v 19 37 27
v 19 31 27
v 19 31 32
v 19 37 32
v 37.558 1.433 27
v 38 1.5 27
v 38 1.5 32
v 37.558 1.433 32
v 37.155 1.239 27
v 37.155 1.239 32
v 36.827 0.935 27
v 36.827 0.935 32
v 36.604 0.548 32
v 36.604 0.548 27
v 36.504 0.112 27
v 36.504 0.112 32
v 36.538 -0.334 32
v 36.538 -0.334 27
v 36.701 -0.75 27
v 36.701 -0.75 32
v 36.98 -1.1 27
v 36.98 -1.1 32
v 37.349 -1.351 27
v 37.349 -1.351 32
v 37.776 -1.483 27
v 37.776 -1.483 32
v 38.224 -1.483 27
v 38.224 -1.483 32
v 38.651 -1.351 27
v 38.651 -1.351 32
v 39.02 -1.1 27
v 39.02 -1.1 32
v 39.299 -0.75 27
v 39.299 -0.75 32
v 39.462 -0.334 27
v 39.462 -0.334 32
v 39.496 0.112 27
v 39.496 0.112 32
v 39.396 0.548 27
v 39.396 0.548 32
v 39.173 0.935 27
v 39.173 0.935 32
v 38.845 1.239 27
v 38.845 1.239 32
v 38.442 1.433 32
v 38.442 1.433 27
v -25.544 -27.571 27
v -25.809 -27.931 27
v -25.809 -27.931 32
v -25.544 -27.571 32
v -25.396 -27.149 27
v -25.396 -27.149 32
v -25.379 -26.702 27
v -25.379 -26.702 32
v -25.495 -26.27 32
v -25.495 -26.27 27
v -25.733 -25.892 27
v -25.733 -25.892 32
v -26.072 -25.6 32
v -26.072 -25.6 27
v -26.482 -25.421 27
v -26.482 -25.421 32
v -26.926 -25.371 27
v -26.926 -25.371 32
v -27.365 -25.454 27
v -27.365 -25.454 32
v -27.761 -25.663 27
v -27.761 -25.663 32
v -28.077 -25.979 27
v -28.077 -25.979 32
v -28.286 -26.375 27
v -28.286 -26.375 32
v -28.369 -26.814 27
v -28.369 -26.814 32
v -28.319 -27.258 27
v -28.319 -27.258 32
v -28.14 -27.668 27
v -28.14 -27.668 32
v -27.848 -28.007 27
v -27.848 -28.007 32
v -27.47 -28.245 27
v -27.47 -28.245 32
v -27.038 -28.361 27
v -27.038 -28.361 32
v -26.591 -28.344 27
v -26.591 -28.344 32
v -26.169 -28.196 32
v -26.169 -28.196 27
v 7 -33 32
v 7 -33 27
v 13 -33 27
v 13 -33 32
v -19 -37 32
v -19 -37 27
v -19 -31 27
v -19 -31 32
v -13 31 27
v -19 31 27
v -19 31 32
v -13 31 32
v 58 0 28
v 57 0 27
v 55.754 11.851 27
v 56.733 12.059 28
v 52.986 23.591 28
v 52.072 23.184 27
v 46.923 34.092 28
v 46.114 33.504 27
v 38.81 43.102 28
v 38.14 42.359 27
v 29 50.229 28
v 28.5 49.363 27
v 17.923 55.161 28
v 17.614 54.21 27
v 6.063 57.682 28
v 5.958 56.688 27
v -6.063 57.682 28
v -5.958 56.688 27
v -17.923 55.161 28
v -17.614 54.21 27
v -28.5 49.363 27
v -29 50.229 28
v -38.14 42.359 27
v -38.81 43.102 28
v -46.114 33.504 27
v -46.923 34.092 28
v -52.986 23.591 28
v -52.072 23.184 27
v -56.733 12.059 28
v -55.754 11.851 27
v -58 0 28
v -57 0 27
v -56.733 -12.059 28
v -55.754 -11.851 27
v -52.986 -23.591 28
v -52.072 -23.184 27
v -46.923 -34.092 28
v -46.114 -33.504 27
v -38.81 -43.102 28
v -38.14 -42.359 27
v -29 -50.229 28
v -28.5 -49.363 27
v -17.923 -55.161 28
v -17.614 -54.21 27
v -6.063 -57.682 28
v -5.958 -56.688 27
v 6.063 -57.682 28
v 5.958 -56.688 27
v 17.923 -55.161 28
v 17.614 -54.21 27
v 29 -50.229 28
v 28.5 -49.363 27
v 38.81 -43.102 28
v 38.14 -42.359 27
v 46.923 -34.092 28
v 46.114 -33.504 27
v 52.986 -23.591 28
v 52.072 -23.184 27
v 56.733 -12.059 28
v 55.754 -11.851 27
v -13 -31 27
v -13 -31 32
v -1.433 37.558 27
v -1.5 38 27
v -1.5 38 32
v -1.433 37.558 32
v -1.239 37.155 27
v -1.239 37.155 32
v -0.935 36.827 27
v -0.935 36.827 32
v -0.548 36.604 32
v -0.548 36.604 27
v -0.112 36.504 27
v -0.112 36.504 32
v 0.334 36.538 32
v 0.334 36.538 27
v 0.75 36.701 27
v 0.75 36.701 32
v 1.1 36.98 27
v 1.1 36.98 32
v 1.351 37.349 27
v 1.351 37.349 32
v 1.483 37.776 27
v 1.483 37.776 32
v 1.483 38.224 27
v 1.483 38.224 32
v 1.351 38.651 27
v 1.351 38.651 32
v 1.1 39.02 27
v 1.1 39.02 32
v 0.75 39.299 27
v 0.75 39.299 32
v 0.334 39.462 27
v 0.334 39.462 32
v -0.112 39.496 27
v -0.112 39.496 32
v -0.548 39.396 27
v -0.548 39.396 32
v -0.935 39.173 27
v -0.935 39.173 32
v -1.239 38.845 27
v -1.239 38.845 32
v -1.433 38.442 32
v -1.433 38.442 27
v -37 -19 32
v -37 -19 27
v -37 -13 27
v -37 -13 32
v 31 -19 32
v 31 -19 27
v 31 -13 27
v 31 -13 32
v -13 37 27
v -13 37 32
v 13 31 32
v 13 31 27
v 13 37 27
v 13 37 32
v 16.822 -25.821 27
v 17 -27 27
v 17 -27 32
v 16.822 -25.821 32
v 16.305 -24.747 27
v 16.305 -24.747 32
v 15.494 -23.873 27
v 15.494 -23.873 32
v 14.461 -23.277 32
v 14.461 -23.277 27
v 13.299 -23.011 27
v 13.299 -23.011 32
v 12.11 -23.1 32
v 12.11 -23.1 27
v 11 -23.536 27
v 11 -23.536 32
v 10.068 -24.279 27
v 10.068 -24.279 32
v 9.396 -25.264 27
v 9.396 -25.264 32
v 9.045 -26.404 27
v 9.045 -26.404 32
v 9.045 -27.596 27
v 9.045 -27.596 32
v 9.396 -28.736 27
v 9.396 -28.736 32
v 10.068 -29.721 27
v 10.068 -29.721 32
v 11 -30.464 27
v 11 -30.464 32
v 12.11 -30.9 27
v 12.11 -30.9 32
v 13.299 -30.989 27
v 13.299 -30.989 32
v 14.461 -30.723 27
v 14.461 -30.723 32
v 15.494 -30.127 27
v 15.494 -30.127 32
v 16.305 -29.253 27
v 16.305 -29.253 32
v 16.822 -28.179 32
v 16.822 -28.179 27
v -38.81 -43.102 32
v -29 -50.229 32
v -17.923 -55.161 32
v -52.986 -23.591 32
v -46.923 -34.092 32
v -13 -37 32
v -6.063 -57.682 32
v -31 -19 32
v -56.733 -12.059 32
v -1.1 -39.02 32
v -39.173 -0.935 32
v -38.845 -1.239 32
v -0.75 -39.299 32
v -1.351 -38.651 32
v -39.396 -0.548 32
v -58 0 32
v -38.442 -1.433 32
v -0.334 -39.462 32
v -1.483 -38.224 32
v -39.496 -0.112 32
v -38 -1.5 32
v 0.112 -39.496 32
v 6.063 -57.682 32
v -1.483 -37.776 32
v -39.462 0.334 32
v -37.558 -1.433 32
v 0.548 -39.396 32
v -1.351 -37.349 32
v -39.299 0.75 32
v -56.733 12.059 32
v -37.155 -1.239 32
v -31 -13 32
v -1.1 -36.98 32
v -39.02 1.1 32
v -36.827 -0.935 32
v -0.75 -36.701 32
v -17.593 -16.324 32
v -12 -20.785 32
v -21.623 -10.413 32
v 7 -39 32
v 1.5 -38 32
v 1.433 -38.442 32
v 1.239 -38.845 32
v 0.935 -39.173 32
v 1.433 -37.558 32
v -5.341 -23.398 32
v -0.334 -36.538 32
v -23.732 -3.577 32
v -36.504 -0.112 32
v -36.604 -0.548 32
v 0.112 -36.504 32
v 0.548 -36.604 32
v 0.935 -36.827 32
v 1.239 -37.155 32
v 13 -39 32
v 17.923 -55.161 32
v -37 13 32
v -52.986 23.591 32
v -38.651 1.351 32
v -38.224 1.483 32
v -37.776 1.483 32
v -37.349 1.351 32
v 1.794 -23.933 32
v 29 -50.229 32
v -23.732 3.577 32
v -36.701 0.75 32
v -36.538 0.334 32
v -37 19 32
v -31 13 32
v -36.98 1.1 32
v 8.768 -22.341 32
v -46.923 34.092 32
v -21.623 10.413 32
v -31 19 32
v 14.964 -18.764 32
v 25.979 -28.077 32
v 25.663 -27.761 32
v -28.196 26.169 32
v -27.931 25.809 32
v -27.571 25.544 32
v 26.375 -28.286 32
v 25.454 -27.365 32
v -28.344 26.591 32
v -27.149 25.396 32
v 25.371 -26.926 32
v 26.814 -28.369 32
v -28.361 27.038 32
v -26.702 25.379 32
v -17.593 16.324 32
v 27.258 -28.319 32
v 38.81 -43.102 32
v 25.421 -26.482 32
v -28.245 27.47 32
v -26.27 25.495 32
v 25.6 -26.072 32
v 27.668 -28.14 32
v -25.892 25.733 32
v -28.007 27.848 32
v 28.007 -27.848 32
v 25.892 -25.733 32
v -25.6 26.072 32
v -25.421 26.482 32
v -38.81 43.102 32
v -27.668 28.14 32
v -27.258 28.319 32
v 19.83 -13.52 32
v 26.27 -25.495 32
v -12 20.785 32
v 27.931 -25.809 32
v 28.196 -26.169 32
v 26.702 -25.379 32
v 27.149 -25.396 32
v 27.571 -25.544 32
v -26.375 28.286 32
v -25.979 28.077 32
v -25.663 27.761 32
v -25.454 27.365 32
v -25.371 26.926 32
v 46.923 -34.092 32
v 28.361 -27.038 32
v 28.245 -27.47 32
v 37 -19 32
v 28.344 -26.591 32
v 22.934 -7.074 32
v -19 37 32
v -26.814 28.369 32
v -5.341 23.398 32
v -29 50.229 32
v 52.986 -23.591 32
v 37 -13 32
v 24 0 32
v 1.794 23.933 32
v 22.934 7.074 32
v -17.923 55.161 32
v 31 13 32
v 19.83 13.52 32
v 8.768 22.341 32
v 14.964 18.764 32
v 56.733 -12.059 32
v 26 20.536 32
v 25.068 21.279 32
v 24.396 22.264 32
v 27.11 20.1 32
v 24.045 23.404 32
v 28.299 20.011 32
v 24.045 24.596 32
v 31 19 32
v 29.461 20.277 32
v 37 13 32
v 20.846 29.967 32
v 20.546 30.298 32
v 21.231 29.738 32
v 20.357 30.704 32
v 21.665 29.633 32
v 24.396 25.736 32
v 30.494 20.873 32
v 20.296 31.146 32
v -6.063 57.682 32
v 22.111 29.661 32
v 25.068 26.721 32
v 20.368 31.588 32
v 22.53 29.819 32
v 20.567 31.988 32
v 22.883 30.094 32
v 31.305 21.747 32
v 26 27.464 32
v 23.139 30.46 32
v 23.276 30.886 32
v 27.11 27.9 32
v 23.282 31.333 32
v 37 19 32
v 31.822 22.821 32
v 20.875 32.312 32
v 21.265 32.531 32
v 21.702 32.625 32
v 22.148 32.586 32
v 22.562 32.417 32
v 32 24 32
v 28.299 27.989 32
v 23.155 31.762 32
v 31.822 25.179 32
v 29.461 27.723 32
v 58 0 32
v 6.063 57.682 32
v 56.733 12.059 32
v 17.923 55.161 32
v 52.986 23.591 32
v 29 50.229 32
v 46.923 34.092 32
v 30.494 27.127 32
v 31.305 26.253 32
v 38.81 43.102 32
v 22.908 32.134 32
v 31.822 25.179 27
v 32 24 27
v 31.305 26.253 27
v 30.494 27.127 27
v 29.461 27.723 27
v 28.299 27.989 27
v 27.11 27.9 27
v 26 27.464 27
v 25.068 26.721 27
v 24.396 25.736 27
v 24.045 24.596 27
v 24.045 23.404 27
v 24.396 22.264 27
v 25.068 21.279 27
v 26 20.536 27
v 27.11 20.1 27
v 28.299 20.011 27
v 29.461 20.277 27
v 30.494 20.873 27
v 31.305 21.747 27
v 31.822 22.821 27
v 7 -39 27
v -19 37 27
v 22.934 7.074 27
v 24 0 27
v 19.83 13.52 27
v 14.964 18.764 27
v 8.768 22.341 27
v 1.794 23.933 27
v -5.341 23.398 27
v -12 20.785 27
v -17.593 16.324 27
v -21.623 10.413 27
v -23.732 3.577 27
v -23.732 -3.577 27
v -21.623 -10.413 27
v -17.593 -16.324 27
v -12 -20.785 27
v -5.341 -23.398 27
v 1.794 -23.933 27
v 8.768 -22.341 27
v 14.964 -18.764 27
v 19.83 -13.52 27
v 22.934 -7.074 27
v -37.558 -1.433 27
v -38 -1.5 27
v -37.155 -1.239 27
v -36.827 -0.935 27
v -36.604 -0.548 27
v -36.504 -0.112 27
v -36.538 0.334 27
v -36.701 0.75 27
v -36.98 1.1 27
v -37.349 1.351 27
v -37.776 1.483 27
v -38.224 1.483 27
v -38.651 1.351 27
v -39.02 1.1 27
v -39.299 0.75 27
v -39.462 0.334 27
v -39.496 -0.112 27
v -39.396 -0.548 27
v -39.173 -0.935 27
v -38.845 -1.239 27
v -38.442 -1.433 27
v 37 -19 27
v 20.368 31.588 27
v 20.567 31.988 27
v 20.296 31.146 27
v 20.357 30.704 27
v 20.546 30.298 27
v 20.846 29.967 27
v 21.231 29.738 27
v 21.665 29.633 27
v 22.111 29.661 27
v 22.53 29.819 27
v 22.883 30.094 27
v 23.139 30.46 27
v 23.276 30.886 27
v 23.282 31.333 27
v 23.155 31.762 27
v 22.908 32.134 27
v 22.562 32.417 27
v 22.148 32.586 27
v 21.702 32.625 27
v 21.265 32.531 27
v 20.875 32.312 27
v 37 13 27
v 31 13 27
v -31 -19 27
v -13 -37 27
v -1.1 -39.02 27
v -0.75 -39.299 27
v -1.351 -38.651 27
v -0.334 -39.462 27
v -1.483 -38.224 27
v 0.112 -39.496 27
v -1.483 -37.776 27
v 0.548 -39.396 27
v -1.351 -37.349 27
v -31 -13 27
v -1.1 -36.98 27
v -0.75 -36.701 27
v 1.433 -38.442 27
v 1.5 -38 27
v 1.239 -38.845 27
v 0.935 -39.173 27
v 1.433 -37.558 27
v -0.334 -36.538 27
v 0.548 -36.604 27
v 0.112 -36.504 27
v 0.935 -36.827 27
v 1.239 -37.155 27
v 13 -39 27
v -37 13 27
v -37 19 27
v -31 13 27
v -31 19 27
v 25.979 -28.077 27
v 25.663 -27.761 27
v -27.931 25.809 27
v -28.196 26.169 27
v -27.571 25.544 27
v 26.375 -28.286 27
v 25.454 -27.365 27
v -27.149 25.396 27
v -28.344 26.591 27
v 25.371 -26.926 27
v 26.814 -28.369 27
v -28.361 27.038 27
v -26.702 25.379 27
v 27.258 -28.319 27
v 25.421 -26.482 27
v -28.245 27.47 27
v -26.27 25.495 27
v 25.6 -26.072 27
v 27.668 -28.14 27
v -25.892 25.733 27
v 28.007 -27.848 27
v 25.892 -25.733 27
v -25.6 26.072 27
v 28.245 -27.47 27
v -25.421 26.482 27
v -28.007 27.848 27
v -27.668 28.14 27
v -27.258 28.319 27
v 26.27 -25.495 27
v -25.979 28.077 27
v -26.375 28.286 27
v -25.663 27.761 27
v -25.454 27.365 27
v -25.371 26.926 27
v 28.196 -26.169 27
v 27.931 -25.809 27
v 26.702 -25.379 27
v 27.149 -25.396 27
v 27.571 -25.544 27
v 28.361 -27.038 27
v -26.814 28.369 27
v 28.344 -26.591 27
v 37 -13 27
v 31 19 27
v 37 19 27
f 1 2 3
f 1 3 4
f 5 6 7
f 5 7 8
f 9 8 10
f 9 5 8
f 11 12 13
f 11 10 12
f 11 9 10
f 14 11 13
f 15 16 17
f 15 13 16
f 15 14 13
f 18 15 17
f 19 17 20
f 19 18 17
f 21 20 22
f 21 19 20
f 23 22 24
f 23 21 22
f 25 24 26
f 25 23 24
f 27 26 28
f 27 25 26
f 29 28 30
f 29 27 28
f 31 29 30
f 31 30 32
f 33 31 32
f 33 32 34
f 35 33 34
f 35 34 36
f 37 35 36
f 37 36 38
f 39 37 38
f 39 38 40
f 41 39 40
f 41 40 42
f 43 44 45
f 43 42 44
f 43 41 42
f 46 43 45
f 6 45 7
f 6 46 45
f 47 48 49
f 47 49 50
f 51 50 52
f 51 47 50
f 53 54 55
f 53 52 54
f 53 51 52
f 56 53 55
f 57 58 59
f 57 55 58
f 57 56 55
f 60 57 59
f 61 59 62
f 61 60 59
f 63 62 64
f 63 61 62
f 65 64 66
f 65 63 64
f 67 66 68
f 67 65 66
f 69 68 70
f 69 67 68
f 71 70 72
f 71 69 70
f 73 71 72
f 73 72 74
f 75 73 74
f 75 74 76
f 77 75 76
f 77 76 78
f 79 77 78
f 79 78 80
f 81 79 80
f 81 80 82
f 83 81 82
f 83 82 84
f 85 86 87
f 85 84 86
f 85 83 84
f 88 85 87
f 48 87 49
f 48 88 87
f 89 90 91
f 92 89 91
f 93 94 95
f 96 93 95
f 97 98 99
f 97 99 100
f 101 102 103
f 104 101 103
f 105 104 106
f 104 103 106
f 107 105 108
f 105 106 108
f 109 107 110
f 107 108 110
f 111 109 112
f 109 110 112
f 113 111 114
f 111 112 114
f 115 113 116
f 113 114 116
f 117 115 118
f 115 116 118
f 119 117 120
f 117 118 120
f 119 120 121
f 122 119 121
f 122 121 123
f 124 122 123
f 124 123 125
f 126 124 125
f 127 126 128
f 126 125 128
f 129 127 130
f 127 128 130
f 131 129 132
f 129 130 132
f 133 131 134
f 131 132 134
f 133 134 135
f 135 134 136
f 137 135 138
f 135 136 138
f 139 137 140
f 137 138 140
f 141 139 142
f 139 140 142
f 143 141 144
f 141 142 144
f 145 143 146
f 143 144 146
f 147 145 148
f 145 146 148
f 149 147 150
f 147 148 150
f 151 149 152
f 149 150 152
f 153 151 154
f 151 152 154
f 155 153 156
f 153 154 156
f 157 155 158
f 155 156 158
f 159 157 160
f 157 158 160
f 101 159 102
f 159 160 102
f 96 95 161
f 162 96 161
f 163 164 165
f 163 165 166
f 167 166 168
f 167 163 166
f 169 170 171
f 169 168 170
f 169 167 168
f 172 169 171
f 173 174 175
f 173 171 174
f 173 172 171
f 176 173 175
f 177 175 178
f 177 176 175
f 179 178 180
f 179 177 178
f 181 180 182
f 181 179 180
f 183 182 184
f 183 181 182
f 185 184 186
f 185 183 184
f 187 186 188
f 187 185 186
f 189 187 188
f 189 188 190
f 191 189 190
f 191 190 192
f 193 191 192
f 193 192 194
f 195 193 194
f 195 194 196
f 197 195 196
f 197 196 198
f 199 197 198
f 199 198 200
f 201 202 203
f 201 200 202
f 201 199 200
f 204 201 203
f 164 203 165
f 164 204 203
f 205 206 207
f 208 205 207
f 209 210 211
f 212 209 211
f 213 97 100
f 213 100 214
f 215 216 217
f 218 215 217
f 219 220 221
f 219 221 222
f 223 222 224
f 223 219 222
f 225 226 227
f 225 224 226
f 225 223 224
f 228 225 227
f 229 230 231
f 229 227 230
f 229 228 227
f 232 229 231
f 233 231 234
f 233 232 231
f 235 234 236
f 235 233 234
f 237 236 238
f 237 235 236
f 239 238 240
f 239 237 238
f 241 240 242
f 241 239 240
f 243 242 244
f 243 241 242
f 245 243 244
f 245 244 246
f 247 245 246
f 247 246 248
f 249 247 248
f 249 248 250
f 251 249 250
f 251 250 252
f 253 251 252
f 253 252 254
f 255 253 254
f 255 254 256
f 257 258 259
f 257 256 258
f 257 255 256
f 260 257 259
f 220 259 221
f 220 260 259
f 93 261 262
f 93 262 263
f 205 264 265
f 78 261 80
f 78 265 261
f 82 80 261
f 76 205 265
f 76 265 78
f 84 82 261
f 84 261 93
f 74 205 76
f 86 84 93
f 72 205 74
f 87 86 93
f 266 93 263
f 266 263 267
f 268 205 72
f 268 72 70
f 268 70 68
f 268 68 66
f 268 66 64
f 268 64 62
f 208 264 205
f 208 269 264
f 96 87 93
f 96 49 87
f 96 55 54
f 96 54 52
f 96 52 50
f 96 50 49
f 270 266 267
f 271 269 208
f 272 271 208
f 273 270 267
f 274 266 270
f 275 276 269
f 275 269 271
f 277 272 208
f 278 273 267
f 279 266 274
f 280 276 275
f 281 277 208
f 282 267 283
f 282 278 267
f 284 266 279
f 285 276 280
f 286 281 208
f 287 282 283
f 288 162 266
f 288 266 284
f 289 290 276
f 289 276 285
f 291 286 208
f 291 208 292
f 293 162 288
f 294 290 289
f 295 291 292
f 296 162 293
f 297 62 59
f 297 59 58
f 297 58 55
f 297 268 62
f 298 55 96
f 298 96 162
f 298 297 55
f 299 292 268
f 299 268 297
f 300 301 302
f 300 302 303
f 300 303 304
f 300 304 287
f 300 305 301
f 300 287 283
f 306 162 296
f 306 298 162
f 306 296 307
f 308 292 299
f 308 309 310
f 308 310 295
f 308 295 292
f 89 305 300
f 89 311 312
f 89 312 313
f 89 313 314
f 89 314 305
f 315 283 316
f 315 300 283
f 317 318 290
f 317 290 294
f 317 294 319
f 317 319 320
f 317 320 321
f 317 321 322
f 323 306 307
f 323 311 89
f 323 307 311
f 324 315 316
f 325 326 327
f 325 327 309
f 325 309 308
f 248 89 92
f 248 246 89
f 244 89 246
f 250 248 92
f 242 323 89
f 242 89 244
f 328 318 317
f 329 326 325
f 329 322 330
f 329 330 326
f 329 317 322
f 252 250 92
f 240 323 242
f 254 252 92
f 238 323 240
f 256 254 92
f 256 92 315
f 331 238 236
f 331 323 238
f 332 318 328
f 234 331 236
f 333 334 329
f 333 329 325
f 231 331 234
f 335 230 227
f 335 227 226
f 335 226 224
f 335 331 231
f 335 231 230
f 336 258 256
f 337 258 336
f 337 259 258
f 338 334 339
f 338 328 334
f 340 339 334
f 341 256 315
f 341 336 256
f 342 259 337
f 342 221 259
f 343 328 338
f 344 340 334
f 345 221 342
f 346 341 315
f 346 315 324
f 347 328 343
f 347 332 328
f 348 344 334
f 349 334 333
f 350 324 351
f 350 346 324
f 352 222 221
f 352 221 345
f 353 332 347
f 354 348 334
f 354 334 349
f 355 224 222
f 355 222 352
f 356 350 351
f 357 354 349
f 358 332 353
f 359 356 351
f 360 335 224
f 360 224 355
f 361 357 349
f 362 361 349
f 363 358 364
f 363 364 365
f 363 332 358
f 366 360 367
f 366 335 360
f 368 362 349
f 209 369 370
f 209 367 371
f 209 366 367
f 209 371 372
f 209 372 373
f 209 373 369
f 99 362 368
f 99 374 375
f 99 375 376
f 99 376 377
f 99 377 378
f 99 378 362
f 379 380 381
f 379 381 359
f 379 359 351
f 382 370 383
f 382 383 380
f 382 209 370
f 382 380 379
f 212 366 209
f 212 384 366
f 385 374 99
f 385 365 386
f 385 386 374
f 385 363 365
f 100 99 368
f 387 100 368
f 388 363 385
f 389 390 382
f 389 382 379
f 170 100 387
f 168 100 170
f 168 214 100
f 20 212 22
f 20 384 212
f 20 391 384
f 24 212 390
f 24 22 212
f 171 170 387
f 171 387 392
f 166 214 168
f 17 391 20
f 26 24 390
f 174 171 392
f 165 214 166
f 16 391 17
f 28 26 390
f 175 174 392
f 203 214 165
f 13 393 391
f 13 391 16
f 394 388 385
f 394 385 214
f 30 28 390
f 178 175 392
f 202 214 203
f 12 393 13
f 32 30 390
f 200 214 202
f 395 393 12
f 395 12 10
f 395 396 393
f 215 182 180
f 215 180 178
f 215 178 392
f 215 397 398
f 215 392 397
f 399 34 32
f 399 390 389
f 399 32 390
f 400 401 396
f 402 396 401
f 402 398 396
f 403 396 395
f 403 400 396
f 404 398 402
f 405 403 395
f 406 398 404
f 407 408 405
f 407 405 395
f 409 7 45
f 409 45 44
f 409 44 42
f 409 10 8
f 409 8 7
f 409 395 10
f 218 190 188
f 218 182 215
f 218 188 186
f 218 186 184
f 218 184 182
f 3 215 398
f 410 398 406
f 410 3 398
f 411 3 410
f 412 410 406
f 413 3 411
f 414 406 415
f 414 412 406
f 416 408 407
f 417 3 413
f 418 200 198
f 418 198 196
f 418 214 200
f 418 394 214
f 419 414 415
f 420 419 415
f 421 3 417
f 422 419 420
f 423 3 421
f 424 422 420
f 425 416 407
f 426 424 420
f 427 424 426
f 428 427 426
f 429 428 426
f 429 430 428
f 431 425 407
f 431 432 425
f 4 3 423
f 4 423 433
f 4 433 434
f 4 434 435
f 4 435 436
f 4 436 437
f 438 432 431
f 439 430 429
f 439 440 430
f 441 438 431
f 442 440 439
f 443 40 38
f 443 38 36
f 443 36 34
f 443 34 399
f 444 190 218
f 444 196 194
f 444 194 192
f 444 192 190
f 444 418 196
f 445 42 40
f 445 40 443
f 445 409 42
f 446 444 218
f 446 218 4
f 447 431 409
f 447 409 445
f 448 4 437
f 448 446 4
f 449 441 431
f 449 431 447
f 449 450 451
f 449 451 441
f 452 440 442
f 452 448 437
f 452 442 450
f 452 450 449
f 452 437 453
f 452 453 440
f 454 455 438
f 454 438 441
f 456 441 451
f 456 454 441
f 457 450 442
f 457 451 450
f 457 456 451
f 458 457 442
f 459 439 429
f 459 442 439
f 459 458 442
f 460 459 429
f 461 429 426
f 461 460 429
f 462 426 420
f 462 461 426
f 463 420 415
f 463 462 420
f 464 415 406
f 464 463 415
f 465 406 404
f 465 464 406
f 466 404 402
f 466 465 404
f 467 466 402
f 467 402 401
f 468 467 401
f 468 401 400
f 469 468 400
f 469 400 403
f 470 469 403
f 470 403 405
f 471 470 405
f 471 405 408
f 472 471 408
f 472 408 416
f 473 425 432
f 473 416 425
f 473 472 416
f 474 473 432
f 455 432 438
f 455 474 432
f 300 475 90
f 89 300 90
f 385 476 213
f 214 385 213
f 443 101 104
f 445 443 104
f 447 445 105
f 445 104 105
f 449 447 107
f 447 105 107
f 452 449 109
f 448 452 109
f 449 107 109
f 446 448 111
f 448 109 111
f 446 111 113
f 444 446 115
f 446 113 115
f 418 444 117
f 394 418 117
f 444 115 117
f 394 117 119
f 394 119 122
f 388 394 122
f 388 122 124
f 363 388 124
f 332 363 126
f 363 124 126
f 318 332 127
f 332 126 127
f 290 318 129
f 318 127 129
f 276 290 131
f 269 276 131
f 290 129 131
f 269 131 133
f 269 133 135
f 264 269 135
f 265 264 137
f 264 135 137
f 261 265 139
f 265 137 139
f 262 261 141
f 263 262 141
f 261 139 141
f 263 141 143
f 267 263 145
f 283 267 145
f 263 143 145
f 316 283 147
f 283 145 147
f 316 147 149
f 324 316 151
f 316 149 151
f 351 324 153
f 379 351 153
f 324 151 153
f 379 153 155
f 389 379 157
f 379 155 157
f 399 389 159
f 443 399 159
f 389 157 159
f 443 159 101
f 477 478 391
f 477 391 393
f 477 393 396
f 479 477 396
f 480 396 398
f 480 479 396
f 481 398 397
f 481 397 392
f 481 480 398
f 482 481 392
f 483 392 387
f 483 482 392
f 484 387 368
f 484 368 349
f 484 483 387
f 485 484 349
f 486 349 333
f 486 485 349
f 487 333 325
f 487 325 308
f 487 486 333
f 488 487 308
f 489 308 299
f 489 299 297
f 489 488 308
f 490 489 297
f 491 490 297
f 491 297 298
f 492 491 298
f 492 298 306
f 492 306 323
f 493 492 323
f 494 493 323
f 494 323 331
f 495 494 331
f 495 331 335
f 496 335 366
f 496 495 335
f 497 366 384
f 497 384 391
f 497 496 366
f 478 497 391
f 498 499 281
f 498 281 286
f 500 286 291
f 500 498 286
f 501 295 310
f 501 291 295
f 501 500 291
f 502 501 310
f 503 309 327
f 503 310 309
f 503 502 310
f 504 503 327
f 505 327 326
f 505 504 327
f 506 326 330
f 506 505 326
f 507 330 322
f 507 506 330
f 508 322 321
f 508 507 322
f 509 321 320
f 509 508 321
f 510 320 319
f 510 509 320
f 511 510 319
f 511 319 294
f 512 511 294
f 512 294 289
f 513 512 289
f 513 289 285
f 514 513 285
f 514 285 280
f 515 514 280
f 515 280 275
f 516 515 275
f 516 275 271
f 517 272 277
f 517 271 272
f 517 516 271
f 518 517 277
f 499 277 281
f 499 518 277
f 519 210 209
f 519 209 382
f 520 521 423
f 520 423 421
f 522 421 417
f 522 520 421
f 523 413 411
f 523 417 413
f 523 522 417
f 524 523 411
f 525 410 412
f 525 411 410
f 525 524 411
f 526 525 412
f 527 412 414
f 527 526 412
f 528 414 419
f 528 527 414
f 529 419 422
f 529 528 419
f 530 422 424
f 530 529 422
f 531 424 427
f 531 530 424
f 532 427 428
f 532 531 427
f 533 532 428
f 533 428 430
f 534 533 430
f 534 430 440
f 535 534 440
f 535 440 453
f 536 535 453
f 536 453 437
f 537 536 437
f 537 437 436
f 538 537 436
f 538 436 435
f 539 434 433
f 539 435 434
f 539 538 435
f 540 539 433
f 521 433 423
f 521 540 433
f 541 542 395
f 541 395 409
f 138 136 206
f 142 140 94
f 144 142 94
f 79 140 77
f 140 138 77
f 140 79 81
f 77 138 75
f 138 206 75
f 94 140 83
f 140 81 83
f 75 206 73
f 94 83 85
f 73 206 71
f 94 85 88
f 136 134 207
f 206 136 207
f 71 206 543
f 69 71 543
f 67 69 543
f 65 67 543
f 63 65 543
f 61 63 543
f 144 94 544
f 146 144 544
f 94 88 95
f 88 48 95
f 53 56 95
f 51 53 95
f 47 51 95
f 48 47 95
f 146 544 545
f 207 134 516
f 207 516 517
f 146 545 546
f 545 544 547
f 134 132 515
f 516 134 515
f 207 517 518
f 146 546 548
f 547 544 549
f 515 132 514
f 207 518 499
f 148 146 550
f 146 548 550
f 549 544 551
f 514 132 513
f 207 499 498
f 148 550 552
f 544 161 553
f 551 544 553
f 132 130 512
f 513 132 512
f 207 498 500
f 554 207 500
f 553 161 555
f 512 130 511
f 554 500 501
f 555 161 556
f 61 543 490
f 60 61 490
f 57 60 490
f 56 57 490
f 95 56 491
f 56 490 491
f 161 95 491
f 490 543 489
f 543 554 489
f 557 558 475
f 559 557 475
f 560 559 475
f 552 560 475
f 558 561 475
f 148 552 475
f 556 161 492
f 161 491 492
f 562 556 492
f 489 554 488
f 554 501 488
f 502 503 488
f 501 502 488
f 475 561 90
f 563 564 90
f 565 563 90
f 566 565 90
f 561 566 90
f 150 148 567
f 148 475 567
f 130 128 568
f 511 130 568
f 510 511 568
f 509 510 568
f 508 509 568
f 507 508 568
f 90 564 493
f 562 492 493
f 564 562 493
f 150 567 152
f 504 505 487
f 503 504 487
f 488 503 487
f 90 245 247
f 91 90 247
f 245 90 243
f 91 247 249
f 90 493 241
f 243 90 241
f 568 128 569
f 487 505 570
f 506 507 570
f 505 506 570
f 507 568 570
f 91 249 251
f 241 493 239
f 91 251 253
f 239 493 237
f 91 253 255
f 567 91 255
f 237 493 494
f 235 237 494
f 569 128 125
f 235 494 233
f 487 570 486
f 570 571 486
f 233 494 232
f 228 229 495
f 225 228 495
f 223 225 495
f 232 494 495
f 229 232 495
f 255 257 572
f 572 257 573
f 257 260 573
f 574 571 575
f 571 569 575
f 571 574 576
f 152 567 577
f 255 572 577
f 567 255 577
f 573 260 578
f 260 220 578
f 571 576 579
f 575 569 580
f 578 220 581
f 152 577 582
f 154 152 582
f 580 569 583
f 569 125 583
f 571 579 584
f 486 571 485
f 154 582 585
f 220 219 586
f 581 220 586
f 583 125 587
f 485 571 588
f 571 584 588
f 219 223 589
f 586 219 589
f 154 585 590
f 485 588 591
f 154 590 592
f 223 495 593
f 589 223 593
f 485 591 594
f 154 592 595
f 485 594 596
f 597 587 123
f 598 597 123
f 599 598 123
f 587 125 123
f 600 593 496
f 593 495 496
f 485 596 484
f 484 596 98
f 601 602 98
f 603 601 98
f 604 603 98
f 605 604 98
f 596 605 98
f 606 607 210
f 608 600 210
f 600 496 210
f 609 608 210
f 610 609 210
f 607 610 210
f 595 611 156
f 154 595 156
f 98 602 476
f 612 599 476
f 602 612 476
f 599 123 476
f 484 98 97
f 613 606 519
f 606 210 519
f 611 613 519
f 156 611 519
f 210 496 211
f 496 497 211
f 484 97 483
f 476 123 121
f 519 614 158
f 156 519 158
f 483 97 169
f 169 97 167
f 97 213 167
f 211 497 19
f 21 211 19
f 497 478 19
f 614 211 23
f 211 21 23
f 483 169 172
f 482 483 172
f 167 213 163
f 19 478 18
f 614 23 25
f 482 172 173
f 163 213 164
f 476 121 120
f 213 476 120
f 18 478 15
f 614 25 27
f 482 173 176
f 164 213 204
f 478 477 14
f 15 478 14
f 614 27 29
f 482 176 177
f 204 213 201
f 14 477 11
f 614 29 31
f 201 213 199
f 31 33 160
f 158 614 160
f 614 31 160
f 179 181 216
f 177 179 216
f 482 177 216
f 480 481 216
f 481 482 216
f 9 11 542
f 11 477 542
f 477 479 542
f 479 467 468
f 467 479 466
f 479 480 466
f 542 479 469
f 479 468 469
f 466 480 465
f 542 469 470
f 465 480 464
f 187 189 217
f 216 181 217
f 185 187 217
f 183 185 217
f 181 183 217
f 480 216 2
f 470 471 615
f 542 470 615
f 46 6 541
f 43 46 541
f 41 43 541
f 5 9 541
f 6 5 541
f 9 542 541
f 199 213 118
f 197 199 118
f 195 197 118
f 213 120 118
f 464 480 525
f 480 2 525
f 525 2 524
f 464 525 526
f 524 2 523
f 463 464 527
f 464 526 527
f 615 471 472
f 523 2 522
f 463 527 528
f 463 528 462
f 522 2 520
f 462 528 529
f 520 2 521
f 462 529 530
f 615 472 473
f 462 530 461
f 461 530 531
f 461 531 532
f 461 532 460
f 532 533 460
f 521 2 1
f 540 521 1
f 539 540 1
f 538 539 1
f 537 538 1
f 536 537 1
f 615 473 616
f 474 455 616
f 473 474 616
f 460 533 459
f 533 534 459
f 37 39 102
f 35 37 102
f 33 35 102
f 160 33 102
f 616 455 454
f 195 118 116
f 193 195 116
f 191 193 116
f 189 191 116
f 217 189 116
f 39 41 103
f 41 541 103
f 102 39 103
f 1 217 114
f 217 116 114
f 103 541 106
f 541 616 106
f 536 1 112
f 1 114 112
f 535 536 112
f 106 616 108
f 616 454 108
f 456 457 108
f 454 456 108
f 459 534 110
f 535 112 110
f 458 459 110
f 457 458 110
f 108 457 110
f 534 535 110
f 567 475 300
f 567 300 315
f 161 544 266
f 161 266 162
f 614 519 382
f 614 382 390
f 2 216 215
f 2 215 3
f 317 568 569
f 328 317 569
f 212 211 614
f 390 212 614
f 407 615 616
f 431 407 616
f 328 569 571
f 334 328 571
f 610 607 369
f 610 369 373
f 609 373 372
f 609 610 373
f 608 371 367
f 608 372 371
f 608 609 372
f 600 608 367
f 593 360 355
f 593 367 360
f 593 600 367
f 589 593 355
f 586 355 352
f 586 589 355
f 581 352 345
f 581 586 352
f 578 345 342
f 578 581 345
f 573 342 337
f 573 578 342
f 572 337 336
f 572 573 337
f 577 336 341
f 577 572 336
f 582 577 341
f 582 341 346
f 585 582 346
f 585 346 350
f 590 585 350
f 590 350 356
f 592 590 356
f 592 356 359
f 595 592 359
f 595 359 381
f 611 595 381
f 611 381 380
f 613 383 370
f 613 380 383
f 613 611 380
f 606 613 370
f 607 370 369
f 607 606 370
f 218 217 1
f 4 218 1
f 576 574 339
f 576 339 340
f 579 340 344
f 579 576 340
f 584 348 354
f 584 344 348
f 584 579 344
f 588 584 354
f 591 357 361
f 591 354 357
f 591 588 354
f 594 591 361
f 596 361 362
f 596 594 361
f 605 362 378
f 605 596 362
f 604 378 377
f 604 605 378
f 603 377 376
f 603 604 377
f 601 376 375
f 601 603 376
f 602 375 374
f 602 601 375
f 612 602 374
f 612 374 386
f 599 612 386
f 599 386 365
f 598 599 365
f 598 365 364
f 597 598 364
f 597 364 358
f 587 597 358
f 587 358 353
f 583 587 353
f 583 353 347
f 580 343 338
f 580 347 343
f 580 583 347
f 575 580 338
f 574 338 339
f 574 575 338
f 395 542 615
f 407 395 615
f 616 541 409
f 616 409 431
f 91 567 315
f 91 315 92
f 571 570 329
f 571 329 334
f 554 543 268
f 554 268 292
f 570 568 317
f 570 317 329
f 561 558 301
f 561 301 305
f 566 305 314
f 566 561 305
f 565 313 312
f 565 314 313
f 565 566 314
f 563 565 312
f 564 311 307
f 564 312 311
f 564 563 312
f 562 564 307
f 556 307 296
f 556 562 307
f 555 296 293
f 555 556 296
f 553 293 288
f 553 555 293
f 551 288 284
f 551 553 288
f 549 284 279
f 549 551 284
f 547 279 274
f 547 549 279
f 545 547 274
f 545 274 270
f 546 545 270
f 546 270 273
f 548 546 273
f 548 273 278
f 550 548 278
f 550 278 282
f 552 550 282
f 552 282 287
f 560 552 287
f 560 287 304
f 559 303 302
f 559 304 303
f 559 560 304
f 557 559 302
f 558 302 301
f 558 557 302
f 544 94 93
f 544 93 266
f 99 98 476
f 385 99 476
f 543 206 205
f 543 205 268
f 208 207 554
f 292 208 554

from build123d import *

# Parameters (mm, degrees)
CYLINDER2136_R               = 1.5
CYLINDER2136_DEPTH           = 100
CYLINDER2139_R               = 1.5
CYLINDER2139_DEPTH           = 100
CYLINDER2139_PLACEMENT_ANGLE = 145
CYLINDER2137_R               = 1.5
CYLINDER2137_DEPTH           = 100
CYLINDER2140_R               = 1.5
CYLINDER2140_DEPTH           = 100
CYLINDER2140_PLACEMENT_ANGLE = 225
CYLINDER2141_R               = 1.5
CYLINDER2141_DEPTH           = 100
CYLINDER2142_R               = 1.5
CYLINDER2142_DEPTH           = 100
CYLINDER2142_PLACEMENT_ANGLE = 45
CYLINDER2135_R               = 1.5
CYLINDER2135_DEPTH           = 100
CYLINDER2138_R               = 1.5
CYLINDER2138_DEPTH           = 100
CYLINDER2138_PLACEMENT_ANGLE = 45
CYLINDER2113_R               = 4
CYLINDER2113_DEPTH           = 40
CYLINDER2115_R               = 4
CYLINDER2115_DEPTH           = 40
CYLINDER2118_R               = 4
CYLINDER2118_DEPTH           = 40
CYLINDER2117_R               = 4
CYLINDER2117_DEPTH           = 40
CYLINDER2112_R               = 4
CYLINDER2112_DEPTH           = 40
CYLINDER2111_R               = 4
CYLINDER2111_DEPTH           = 40
CYLINDER2116_R               = 4
CYLINDER2116_DEPTH           = 40
CYLINDER2114_R               = 4
CYLINDER2114_DEPTH           = 40
BOX1004_W                    = 6
BOX1004_H                    = 6
BOX1004_DEPTH                = 20
BOX1005_W                    = 6
BOX1005_H                    = 6
BOX1005_DEPTH                = 20
BOX1006_W                    = 6
BOX1006_H                    = 6
BOX1006_DEPTH                = 20
BOX1007_W                    = 6
BOX1007_H                    = 6
BOX1007_DEPTH                = 20
BOX1008_W                    = 6
BOX1008_H                    = 6
BOX1008_DEPTH                = 20
BOX1009_W                    = 6
BOX1009_H                    = 6
BOX1009_DEPTH                = 20
BOX1010_W                    = 6
BOX1010_H                    = 6
BOX1010_DEPTH                = 20
BOX_W                        = 6
BOX_H                        = 6
BOX_DEPTH                    = 20
TUBE088_R                    = 58
TUBE088_R_2                  = 24
TUBE088_DEPTH                = 5
CHAMFER083_SIZE              = 1


with BuildPart() as v_lec2136:
    # Cylinder2136 → Cylinder2136 (new body)
    with BuildSketch(Plane(origin=(38, 0, 0), x_dir=(0, 1, 0), z_dir=(0, 0, 1))):
        Circle(CYLINDER2136_R)
    extrude(amount=CYLINDER2136_DEPTH)


with BuildPart() as v_lec2139:
    # Cylinder2139 → Cylinder2139 (new body)
    with BuildSketch(Plane.XY):
        Circle(CYLINDER2139_R)
    extrude(amount=CYLINDER2139_DEPTH)


with BuildPart() as v_lec2139_1:
    # Cylinder2139 placement: moved
    add(v_lec2139.part.moved(Location((21.795905, 31.127778, 0))).rotate(Axis((21.795905, 31.127778, 0), (0, 0, 1)), CYLINDER2139_PLACEMENT_ANGLE))


with BuildPart() as v_lec2137:
    # Cylinder2137 → Cylinder2137 (new body)
    with BuildSketch(Plane(origin=(0, 38, 0), x_dir=(-1, 0, 0), z_dir=(0, 0, 1))):
        Circle(CYLINDER2137_R)
    extrude(amount=CYLINDER2137_DEPTH)


with BuildPart() as v_lec2140:
    # Cylinder2140 → Cylinder2140 (new body)
    with BuildSketch(Plane.XY):
        Circle(CYLINDER2140_R)
    extrude(amount=CYLINDER2140_DEPTH)


with BuildPart() as v_lec2140_1:
    # Cylinder2140 placement: moved
    add(v_lec2140.part.moved(Location((-26.870058, 26.870058, 0))).rotate(Axis((-26.870058, 26.870058, 0), (0, 0, 1)), CYLINDER2140_PLACEMENT_ANGLE))


with BuildPart() as v_lec2141:
    # Cylinder2141 → Cylinder2141 (new body)
    with BuildSketch(Plane(origin=(-38, 0, 0), x_dir=(0, -1, 0), z_dir=(0, 0, 1))):
        Circle(CYLINDER2141_R)
    extrude(amount=CYLINDER2141_DEPTH)


with BuildPart() as v_lec2142:
    # Cylinder2142 → Cylinder2142 (new body)
    with BuildSketch(Plane.XY):
        Circle(CYLINDER2142_R)
    extrude(amount=CYLINDER2142_DEPTH)


with BuildPart() as v_lec2142_1:
    # Cylinder2142 placement: moved
    add(v_lec2142.part.moved(Location((-26.870058, -26.870058, 0))).rotate(Axis((-26.870058, -26.870058, 0), (0, 0, -1)), CYLINDER2142_PLACEMENT_ANGLE))


with BuildPart() as v_lec2135:
    # Cylinder2135 → Cylinder2135 (new body)
    with BuildSketch(Plane(origin=(0, -38, 0), x_dir=(1, 0, 0), z_dir=(0, 0, 1))):
        Circle(CYLINDER2135_R)
    extrude(amount=CYLINDER2135_DEPTH)


with BuildPart() as compound1123:
    # Cylinder2138 → Cylinder2138 (new body)
    with BuildSketch(Plane.XY):
        Circle(CYLINDER2138_R)
    extrude(amount=CYLINDER2138_DEPTH)


with BuildPart() as compound1123_1:
    # Cylinder2138 placement: moved
    add(compound1123.part.moved(Location((26.870058, -26.870058, 0))).rotate(Axis((26.870058, -26.870058, 0), (0, 0, 1)), CYLINDER2138_PLACEMENT_ANGLE))

    # Compound1123: union Válec2136, Válec2139, Válec2137, Válec2140, Válec2141, Válec2142, Válec2135
    add(v_lec2136.part)
    add(v_lec2139_1.part)
    add(v_lec2137.part)
    add(v_lec2140_1.part)
    add(v_lec2141.part)
    add(v_lec2142_1.part)
    add(v_lec2135.part)


with BuildPart() as v_lec2113:
    # Cylinder2113 → Cylinder2113 (new body)
    with BuildSketch(Plane(origin=(103, 12, -20), x_dir=(1, 0, 0), z_dir=(0, 0, 1))):
        Circle(CYLINDER2113_R)
    extrude(amount=CYLINDER2113_DEPTH)


with BuildPart() as v_lec2115:
    # Cylinder2115 → Cylinder2115 (new body)
    with BuildSketch(Plane(origin=(76, 24, -18), x_dir=(1, 0, 0), z_dir=(0, 0, 1))):
        Circle(CYLINDER2115_R)
    extrude(amount=CYLINDER2115_DEPTH)


with BuildPart() as v_lec2118:
    # Cylinder2118 → Cylinder2118 (new body)
    with BuildSketch(Plane(origin=(91, -27, -18), x_dir=(1, 0, 0), z_dir=(0, 0, 1))):
        Circle(CYLINDER2118_R)
    extrude(amount=CYLINDER2118_DEPTH)


with BuildPart() as v_lec2117:
    # Cylinder2117 → Cylinder2117 (new body)
    with BuildSketch(Plane(origin=(13, -27, -18), x_dir=(1, 0, 0), z_dir=(0, 0, 1))):
        Circle(CYLINDER2117_R)
    extrude(amount=CYLINDER2117_DEPTH)


with BuildPart() as v_lec2112:
    # Cylinder2112 → Cylinder2112 (new body)
    with BuildSketch(Plane(origin=(28, 24, -18), x_dir=(1, 0, 0), z_dir=(0, 0, 1))):
        Circle(CYLINDER2112_R)
    extrude(amount=CYLINDER2112_DEPTH)


with BuildPart() as v_lec2111:
    # Cylinder2111 → Cylinder2111 (new body)
    with BuildSketch(Plane(origin=(1, -12, -18), x_dir=(1, 0, 0), z_dir=(0, 0, 1))):
        Circle(CYLINDER2111_R)
    extrude(amount=CYLINDER2111_DEPTH)


with BuildPart() as v_lec2116:
    # Cylinder2116 → Cylinder2116 (new body)
    with BuildSketch(Plane(origin=(1, 12, -18), x_dir=(1, 0, 0), z_dir=(0, 0, 1))):
        Circle(CYLINDER2116_R)
    extrude(amount=CYLINDER2116_DEPTH)


with BuildPart() as srouby_monoblok_silne004:
    # Cylinder2114 → Cylinder2114 (new body)
    with BuildSketch(Plane(origin=(103, -12, -20), x_dir=(1, 0, 0), z_dir=(0, 0, 1))):
        Circle(CYLINDER2114_R)
    extrude(amount=CYLINDER2114_DEPTH)

    # Compound1117: union Válec2113, Válec2115, Válec2118, Válec2117, Válec2112, Válec2111, Válec2116
    add(v_lec2113.part)
    add(v_lec2115.part)
    add(v_lec2118.part)
    add(v_lec2117.part)
    add(v_lec2112.part)
    add(v_lec2111.part)
    add(v_lec2116.part)


with BuildPart() as srouby_monoblok_silne004_1:
    # Compound1117 placement: moved
    add(srouby_monoblok_silne004.part.moved(Location((0, 0, 20))))


with BuildPart() as krychle1004:
    # Box1004 → Box1004 (new body)
    with BuildSketch(Plane(origin=(-19, 31, 0), x_dir=(1, 0, 0), z_dir=(0, 0, 1))):
        with Locations((3, 3)):
            Rectangle(BOX1004_W, BOX1004_H)
    extrude(amount=BOX1004_DEPTH)


with BuildPart() as krychle1005:
    # Box1005 → Box1005 (new body)
    with BuildSketch(Plane(origin=(-19, -37, 0), x_dir=(1, 0, 0), z_dir=(0, 0, 1))):
        with Locations((3, 3)):
            Rectangle(BOX1005_W, BOX1005_H)
    extrude(amount=BOX1005_DEPTH)


with BuildPart() as krychle1006:
    # Box1006 → Box1006 (new body)
    with BuildSketch(Plane(origin=(7, -39, 0), x_dir=(1, 0, 0), z_dir=(0, 0, 1))):
        with Locations((3, 3)):
            Rectangle(BOX1006_W, BOX1006_H)
    extrude(amount=BOX1006_DEPTH)


with BuildPart() as krychle1007:
    # Box1007 → Box1007 (new body)
    with BuildSketch(Plane(origin=(31, 13, 0), x_dir=(1, 0, 0), z_dir=(0, 0, 1))):
        with Locations((3, 3)):
            Rectangle(BOX1007_W, BOX1007_H)
    extrude(amount=BOX1007_DEPTH)


with BuildPart() as krychle1008:
    # Box1008 → Box1008 (new body)
    with BuildSketch(Plane(origin=(31, -19, 0), x_dir=(1, 0, 0), z_dir=(0, 0, 1))):
        with Locations((3, 3)):
            Rectangle(BOX1008_W, BOX1008_H)
    extrude(amount=BOX1008_DEPTH)


with BuildPart() as krychle1009:
    # Box1009 → Box1009 (new body)
    with BuildSketch(Plane(origin=(-37, 13, 0), x_dir=(1, 0, 0), z_dir=(0, 0, 1))):
        with Locations((3, 3)):
            Rectangle(BOX1009_W, BOX1009_H)
    extrude(amount=BOX1009_DEPTH)


with BuildPart() as krychle1010:
    # Box1010 → Box1010 (new body)
    with BuildSketch(Plane(origin=(-37, -19, 0), x_dir=(1, 0, 0), z_dir=(0, 0, 1))):
        with Locations((3, 3)):
            Rectangle(BOX1010_W, BOX1010_H)
    extrude(amount=BOX1010_DEPTH)


with BuildPart() as compound1116:
    # Box → Box (new body)
    with BuildSketch(Plane(origin=(13, 31, 0), x_dir=(1, 0, 0), z_dir=(0, 0, 1))):
        with Locations((3, 3)):
            Rectangle(BOX_W, BOX_H)
    extrude(amount=BOX_DEPTH)

    # Compound1116: union Krychle1004, Krychle1005, Krychle1006, Krychle1007, Krychle1008, Krychle1009, Krychle1010
    add(krychle1004.part)
    add(krychle1005.part)
    add(krychle1006.part)
    add(krychle1007.part)
    add(krychle1008.part)
    add(krychle1009.part)
    add(krychle1010.part)


with BuildPart() as compound1116_1:
    # Compound1116 placement: moved
    add(compound1116.part.moved(Location((0, 0, 22))))


with BuildPart() as chamfer083:
    # Tube088 → Tube088 (new body)
    with BuildSketch(Plane.XY.offset(27)):
        Circle(TUBE088_R)
        Circle(TUBE088_R_2, mode=Mode.SUBTRACT)
    extrude(amount=TUBE088_DEPTH)

    # Cut705: cut Compound1116
    add(compound1116_1.part, mode=Mode.SUBTRACT)

    # Cut708: cut srouby_monoblok_silne004
    add(srouby_monoblok_silne004_1.part, mode=Mode.SUBTRACT)

    # Cut711: cut Compound1123
    add(compound1123_1.part, mode=Mode.SUBTRACT)

    # Chamfer083
    chamfer083_edges = [chamfer083.edges().sort_by_distance(p)[0] for p in [
        (-58, 0, 27),
    ]]
    chamfer(chamfer083_edges, length=CHAMFER083_SIZE)


solid = chamfer083.part
